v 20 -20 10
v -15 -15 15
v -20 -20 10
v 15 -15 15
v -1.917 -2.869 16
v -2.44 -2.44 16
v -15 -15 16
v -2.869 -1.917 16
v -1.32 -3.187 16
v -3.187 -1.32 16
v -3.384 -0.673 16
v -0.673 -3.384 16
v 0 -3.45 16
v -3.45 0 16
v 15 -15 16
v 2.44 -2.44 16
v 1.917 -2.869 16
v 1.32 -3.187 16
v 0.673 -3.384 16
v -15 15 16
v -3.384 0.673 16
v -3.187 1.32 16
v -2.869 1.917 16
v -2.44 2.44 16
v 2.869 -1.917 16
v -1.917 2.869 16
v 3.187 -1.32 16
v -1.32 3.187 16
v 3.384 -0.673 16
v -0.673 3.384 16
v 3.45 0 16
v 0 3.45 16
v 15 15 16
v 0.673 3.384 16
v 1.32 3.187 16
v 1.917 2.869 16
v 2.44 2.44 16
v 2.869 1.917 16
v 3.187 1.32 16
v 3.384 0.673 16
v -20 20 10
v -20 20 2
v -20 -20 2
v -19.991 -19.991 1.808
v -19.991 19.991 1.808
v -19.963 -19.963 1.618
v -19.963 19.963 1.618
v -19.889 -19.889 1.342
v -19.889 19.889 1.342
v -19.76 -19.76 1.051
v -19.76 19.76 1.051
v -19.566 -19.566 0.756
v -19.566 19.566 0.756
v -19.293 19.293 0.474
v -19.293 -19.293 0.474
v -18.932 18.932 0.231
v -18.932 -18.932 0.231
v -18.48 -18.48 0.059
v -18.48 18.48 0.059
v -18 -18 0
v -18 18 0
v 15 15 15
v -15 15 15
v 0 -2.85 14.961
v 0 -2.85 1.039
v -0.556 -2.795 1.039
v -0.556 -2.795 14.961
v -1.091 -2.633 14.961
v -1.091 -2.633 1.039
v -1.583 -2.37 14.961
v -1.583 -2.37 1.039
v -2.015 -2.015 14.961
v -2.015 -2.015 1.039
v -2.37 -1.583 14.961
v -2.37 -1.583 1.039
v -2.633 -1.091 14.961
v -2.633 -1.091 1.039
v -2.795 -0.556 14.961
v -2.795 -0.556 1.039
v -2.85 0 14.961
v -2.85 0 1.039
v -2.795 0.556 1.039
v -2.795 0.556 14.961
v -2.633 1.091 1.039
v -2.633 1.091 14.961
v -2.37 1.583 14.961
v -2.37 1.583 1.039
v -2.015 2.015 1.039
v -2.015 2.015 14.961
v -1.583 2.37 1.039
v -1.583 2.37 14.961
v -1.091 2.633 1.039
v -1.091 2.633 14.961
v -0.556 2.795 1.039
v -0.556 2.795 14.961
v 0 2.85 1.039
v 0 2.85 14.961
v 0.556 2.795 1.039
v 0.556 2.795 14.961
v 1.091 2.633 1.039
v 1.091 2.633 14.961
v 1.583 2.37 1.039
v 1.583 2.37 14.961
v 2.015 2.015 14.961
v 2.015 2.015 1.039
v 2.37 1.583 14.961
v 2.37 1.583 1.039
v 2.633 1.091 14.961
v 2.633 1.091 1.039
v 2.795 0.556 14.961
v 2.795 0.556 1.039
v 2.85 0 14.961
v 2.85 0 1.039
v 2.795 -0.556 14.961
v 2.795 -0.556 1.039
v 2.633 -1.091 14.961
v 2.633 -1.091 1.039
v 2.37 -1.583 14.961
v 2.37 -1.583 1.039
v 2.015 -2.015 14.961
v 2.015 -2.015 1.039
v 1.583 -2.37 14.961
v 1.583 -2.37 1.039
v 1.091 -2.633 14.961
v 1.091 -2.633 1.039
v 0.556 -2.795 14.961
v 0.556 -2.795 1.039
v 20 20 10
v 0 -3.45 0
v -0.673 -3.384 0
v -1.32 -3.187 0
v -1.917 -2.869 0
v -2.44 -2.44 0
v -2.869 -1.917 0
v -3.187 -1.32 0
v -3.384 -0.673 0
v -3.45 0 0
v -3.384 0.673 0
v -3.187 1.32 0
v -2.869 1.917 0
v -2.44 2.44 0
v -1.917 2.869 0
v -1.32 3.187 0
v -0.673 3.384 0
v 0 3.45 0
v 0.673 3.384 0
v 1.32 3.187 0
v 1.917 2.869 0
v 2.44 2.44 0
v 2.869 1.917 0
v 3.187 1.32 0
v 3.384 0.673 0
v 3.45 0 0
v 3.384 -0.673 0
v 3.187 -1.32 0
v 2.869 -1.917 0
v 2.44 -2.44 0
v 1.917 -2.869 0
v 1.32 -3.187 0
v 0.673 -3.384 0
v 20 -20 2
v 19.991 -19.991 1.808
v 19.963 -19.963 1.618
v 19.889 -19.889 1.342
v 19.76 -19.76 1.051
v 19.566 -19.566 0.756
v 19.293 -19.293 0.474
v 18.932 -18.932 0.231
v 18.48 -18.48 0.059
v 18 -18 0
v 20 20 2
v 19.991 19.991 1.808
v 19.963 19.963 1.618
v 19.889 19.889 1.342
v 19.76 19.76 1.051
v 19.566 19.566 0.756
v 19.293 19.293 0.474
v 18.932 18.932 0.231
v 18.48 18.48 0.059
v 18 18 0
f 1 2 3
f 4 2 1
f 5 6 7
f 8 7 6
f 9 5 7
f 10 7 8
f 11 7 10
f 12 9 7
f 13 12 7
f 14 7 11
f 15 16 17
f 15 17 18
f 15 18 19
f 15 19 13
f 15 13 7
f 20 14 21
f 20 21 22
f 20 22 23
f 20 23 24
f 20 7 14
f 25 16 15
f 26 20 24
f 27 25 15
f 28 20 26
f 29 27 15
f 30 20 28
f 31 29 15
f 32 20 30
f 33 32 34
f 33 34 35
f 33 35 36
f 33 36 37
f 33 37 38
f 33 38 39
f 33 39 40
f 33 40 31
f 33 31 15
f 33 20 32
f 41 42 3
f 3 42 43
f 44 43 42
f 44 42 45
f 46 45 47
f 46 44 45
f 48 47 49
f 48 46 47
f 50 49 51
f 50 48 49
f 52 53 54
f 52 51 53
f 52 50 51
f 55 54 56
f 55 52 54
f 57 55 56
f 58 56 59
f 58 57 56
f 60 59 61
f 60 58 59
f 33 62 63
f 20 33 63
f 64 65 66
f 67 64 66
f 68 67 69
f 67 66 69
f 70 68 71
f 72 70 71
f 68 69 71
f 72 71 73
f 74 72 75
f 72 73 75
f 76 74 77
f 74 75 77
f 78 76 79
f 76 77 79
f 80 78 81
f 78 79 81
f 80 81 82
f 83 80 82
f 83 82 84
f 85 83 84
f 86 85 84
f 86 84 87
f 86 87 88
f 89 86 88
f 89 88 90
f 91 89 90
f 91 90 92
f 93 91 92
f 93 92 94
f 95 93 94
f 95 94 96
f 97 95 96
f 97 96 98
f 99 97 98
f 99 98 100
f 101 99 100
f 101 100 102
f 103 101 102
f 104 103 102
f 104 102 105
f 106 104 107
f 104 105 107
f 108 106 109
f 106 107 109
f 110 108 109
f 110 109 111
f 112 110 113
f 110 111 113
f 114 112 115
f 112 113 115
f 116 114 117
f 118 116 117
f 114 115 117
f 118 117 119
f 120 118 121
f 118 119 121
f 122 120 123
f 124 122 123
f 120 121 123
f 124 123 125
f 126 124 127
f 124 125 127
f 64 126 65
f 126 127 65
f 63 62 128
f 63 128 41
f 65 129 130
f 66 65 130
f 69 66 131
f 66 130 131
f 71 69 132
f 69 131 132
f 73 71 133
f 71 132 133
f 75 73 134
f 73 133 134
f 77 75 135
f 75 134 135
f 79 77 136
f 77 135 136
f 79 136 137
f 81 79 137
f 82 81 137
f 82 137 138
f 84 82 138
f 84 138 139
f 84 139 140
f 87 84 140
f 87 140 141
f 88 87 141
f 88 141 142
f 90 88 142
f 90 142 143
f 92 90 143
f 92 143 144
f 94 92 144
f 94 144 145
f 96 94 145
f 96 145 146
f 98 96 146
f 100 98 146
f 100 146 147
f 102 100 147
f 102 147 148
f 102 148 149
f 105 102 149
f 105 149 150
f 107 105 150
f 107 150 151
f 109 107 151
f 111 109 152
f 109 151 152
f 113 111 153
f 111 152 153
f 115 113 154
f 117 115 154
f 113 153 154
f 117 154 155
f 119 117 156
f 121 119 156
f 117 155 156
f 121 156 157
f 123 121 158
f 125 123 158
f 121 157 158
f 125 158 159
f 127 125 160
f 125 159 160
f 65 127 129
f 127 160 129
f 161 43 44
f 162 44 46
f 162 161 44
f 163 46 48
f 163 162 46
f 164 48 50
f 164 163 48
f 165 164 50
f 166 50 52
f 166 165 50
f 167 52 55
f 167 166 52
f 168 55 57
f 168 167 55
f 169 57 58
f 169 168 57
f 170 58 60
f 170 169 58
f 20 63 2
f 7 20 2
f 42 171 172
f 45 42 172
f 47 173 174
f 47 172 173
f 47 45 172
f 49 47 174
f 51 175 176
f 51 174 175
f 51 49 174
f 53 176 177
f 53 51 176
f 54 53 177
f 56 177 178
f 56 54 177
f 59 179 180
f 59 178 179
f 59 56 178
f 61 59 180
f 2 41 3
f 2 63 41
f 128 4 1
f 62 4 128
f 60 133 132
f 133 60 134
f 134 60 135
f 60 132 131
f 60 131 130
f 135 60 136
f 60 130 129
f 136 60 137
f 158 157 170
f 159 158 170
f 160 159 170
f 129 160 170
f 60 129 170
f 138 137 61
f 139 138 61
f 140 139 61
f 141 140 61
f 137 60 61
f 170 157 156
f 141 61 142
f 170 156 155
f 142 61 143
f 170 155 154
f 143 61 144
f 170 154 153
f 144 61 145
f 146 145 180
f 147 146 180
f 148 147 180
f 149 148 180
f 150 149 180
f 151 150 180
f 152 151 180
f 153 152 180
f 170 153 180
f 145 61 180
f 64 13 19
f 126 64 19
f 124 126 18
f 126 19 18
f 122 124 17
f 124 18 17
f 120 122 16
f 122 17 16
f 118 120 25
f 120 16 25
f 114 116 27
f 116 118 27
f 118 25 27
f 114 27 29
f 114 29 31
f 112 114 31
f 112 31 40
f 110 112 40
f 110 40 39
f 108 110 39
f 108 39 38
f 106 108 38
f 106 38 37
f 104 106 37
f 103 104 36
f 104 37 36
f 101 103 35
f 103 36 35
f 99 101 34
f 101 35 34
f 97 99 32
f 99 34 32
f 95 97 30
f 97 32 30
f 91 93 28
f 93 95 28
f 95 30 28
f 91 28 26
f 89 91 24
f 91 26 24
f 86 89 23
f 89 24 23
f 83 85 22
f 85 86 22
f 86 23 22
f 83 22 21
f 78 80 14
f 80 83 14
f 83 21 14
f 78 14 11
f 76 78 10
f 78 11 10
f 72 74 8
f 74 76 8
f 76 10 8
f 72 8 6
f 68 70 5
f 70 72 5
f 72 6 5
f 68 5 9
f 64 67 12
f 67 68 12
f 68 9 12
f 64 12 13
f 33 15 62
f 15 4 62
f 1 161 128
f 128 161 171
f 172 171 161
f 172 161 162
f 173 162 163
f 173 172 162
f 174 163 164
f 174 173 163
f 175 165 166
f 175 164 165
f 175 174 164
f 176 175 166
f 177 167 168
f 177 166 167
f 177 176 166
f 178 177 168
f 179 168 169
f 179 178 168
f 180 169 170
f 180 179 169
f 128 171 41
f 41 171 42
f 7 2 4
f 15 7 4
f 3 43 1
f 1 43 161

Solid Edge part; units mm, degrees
sketch "Sketch1" plane through (0, 0, 0) normal (0, 0, 1) x (1, 0, 0)
  line L0 (-20, -20) -> (20, -20)
  line L1 (20, -20) -> (20, 20)
  line L2 (20, 20) -> (-20, 20)
  line L3 (-20, 20) -> (-20, -20)
  dimension "D1" = 40
extrude "Protrusion1" add sketch "Sketch1" along normal blind 10
sketch "Sketch2" plane through (0, 0, 10) normal (0, 0, 1) x (1, 0, 0)
  line L0 (-15, -15) -> (15, -15)
  line L1 (15, -15) -> (15, 15)
  line L2 (15, 15) -> (-15, 15)
  line L3 (-15, 15) -> (-15, -15)
  dimension "D1" = 30
extrude "ExtrudedProtrusion_2" add sketch "Sketch2" along normal blind 6
chamfer "Chamfer_1" distance 5 angle 45 4 edges at (-15, 0, 10) (0, -15, 10) (0, 15, 10) (15, 0, 10)
hole "Hole_1" at (0, 0, 16) direction (0, 0, -1) diameter 5.7 depth 40 tip angle 118 start chamfer 0.6 start chamfer angle 30 end chamfer 0.6 end chamfer angle 30
fillet "Round_1" radius 2 4 edges at (-20, 0, 0) (0, 20, 0) (20, 0, 0) (0, -20, 0)
properties material "Polyethylene, low density"
